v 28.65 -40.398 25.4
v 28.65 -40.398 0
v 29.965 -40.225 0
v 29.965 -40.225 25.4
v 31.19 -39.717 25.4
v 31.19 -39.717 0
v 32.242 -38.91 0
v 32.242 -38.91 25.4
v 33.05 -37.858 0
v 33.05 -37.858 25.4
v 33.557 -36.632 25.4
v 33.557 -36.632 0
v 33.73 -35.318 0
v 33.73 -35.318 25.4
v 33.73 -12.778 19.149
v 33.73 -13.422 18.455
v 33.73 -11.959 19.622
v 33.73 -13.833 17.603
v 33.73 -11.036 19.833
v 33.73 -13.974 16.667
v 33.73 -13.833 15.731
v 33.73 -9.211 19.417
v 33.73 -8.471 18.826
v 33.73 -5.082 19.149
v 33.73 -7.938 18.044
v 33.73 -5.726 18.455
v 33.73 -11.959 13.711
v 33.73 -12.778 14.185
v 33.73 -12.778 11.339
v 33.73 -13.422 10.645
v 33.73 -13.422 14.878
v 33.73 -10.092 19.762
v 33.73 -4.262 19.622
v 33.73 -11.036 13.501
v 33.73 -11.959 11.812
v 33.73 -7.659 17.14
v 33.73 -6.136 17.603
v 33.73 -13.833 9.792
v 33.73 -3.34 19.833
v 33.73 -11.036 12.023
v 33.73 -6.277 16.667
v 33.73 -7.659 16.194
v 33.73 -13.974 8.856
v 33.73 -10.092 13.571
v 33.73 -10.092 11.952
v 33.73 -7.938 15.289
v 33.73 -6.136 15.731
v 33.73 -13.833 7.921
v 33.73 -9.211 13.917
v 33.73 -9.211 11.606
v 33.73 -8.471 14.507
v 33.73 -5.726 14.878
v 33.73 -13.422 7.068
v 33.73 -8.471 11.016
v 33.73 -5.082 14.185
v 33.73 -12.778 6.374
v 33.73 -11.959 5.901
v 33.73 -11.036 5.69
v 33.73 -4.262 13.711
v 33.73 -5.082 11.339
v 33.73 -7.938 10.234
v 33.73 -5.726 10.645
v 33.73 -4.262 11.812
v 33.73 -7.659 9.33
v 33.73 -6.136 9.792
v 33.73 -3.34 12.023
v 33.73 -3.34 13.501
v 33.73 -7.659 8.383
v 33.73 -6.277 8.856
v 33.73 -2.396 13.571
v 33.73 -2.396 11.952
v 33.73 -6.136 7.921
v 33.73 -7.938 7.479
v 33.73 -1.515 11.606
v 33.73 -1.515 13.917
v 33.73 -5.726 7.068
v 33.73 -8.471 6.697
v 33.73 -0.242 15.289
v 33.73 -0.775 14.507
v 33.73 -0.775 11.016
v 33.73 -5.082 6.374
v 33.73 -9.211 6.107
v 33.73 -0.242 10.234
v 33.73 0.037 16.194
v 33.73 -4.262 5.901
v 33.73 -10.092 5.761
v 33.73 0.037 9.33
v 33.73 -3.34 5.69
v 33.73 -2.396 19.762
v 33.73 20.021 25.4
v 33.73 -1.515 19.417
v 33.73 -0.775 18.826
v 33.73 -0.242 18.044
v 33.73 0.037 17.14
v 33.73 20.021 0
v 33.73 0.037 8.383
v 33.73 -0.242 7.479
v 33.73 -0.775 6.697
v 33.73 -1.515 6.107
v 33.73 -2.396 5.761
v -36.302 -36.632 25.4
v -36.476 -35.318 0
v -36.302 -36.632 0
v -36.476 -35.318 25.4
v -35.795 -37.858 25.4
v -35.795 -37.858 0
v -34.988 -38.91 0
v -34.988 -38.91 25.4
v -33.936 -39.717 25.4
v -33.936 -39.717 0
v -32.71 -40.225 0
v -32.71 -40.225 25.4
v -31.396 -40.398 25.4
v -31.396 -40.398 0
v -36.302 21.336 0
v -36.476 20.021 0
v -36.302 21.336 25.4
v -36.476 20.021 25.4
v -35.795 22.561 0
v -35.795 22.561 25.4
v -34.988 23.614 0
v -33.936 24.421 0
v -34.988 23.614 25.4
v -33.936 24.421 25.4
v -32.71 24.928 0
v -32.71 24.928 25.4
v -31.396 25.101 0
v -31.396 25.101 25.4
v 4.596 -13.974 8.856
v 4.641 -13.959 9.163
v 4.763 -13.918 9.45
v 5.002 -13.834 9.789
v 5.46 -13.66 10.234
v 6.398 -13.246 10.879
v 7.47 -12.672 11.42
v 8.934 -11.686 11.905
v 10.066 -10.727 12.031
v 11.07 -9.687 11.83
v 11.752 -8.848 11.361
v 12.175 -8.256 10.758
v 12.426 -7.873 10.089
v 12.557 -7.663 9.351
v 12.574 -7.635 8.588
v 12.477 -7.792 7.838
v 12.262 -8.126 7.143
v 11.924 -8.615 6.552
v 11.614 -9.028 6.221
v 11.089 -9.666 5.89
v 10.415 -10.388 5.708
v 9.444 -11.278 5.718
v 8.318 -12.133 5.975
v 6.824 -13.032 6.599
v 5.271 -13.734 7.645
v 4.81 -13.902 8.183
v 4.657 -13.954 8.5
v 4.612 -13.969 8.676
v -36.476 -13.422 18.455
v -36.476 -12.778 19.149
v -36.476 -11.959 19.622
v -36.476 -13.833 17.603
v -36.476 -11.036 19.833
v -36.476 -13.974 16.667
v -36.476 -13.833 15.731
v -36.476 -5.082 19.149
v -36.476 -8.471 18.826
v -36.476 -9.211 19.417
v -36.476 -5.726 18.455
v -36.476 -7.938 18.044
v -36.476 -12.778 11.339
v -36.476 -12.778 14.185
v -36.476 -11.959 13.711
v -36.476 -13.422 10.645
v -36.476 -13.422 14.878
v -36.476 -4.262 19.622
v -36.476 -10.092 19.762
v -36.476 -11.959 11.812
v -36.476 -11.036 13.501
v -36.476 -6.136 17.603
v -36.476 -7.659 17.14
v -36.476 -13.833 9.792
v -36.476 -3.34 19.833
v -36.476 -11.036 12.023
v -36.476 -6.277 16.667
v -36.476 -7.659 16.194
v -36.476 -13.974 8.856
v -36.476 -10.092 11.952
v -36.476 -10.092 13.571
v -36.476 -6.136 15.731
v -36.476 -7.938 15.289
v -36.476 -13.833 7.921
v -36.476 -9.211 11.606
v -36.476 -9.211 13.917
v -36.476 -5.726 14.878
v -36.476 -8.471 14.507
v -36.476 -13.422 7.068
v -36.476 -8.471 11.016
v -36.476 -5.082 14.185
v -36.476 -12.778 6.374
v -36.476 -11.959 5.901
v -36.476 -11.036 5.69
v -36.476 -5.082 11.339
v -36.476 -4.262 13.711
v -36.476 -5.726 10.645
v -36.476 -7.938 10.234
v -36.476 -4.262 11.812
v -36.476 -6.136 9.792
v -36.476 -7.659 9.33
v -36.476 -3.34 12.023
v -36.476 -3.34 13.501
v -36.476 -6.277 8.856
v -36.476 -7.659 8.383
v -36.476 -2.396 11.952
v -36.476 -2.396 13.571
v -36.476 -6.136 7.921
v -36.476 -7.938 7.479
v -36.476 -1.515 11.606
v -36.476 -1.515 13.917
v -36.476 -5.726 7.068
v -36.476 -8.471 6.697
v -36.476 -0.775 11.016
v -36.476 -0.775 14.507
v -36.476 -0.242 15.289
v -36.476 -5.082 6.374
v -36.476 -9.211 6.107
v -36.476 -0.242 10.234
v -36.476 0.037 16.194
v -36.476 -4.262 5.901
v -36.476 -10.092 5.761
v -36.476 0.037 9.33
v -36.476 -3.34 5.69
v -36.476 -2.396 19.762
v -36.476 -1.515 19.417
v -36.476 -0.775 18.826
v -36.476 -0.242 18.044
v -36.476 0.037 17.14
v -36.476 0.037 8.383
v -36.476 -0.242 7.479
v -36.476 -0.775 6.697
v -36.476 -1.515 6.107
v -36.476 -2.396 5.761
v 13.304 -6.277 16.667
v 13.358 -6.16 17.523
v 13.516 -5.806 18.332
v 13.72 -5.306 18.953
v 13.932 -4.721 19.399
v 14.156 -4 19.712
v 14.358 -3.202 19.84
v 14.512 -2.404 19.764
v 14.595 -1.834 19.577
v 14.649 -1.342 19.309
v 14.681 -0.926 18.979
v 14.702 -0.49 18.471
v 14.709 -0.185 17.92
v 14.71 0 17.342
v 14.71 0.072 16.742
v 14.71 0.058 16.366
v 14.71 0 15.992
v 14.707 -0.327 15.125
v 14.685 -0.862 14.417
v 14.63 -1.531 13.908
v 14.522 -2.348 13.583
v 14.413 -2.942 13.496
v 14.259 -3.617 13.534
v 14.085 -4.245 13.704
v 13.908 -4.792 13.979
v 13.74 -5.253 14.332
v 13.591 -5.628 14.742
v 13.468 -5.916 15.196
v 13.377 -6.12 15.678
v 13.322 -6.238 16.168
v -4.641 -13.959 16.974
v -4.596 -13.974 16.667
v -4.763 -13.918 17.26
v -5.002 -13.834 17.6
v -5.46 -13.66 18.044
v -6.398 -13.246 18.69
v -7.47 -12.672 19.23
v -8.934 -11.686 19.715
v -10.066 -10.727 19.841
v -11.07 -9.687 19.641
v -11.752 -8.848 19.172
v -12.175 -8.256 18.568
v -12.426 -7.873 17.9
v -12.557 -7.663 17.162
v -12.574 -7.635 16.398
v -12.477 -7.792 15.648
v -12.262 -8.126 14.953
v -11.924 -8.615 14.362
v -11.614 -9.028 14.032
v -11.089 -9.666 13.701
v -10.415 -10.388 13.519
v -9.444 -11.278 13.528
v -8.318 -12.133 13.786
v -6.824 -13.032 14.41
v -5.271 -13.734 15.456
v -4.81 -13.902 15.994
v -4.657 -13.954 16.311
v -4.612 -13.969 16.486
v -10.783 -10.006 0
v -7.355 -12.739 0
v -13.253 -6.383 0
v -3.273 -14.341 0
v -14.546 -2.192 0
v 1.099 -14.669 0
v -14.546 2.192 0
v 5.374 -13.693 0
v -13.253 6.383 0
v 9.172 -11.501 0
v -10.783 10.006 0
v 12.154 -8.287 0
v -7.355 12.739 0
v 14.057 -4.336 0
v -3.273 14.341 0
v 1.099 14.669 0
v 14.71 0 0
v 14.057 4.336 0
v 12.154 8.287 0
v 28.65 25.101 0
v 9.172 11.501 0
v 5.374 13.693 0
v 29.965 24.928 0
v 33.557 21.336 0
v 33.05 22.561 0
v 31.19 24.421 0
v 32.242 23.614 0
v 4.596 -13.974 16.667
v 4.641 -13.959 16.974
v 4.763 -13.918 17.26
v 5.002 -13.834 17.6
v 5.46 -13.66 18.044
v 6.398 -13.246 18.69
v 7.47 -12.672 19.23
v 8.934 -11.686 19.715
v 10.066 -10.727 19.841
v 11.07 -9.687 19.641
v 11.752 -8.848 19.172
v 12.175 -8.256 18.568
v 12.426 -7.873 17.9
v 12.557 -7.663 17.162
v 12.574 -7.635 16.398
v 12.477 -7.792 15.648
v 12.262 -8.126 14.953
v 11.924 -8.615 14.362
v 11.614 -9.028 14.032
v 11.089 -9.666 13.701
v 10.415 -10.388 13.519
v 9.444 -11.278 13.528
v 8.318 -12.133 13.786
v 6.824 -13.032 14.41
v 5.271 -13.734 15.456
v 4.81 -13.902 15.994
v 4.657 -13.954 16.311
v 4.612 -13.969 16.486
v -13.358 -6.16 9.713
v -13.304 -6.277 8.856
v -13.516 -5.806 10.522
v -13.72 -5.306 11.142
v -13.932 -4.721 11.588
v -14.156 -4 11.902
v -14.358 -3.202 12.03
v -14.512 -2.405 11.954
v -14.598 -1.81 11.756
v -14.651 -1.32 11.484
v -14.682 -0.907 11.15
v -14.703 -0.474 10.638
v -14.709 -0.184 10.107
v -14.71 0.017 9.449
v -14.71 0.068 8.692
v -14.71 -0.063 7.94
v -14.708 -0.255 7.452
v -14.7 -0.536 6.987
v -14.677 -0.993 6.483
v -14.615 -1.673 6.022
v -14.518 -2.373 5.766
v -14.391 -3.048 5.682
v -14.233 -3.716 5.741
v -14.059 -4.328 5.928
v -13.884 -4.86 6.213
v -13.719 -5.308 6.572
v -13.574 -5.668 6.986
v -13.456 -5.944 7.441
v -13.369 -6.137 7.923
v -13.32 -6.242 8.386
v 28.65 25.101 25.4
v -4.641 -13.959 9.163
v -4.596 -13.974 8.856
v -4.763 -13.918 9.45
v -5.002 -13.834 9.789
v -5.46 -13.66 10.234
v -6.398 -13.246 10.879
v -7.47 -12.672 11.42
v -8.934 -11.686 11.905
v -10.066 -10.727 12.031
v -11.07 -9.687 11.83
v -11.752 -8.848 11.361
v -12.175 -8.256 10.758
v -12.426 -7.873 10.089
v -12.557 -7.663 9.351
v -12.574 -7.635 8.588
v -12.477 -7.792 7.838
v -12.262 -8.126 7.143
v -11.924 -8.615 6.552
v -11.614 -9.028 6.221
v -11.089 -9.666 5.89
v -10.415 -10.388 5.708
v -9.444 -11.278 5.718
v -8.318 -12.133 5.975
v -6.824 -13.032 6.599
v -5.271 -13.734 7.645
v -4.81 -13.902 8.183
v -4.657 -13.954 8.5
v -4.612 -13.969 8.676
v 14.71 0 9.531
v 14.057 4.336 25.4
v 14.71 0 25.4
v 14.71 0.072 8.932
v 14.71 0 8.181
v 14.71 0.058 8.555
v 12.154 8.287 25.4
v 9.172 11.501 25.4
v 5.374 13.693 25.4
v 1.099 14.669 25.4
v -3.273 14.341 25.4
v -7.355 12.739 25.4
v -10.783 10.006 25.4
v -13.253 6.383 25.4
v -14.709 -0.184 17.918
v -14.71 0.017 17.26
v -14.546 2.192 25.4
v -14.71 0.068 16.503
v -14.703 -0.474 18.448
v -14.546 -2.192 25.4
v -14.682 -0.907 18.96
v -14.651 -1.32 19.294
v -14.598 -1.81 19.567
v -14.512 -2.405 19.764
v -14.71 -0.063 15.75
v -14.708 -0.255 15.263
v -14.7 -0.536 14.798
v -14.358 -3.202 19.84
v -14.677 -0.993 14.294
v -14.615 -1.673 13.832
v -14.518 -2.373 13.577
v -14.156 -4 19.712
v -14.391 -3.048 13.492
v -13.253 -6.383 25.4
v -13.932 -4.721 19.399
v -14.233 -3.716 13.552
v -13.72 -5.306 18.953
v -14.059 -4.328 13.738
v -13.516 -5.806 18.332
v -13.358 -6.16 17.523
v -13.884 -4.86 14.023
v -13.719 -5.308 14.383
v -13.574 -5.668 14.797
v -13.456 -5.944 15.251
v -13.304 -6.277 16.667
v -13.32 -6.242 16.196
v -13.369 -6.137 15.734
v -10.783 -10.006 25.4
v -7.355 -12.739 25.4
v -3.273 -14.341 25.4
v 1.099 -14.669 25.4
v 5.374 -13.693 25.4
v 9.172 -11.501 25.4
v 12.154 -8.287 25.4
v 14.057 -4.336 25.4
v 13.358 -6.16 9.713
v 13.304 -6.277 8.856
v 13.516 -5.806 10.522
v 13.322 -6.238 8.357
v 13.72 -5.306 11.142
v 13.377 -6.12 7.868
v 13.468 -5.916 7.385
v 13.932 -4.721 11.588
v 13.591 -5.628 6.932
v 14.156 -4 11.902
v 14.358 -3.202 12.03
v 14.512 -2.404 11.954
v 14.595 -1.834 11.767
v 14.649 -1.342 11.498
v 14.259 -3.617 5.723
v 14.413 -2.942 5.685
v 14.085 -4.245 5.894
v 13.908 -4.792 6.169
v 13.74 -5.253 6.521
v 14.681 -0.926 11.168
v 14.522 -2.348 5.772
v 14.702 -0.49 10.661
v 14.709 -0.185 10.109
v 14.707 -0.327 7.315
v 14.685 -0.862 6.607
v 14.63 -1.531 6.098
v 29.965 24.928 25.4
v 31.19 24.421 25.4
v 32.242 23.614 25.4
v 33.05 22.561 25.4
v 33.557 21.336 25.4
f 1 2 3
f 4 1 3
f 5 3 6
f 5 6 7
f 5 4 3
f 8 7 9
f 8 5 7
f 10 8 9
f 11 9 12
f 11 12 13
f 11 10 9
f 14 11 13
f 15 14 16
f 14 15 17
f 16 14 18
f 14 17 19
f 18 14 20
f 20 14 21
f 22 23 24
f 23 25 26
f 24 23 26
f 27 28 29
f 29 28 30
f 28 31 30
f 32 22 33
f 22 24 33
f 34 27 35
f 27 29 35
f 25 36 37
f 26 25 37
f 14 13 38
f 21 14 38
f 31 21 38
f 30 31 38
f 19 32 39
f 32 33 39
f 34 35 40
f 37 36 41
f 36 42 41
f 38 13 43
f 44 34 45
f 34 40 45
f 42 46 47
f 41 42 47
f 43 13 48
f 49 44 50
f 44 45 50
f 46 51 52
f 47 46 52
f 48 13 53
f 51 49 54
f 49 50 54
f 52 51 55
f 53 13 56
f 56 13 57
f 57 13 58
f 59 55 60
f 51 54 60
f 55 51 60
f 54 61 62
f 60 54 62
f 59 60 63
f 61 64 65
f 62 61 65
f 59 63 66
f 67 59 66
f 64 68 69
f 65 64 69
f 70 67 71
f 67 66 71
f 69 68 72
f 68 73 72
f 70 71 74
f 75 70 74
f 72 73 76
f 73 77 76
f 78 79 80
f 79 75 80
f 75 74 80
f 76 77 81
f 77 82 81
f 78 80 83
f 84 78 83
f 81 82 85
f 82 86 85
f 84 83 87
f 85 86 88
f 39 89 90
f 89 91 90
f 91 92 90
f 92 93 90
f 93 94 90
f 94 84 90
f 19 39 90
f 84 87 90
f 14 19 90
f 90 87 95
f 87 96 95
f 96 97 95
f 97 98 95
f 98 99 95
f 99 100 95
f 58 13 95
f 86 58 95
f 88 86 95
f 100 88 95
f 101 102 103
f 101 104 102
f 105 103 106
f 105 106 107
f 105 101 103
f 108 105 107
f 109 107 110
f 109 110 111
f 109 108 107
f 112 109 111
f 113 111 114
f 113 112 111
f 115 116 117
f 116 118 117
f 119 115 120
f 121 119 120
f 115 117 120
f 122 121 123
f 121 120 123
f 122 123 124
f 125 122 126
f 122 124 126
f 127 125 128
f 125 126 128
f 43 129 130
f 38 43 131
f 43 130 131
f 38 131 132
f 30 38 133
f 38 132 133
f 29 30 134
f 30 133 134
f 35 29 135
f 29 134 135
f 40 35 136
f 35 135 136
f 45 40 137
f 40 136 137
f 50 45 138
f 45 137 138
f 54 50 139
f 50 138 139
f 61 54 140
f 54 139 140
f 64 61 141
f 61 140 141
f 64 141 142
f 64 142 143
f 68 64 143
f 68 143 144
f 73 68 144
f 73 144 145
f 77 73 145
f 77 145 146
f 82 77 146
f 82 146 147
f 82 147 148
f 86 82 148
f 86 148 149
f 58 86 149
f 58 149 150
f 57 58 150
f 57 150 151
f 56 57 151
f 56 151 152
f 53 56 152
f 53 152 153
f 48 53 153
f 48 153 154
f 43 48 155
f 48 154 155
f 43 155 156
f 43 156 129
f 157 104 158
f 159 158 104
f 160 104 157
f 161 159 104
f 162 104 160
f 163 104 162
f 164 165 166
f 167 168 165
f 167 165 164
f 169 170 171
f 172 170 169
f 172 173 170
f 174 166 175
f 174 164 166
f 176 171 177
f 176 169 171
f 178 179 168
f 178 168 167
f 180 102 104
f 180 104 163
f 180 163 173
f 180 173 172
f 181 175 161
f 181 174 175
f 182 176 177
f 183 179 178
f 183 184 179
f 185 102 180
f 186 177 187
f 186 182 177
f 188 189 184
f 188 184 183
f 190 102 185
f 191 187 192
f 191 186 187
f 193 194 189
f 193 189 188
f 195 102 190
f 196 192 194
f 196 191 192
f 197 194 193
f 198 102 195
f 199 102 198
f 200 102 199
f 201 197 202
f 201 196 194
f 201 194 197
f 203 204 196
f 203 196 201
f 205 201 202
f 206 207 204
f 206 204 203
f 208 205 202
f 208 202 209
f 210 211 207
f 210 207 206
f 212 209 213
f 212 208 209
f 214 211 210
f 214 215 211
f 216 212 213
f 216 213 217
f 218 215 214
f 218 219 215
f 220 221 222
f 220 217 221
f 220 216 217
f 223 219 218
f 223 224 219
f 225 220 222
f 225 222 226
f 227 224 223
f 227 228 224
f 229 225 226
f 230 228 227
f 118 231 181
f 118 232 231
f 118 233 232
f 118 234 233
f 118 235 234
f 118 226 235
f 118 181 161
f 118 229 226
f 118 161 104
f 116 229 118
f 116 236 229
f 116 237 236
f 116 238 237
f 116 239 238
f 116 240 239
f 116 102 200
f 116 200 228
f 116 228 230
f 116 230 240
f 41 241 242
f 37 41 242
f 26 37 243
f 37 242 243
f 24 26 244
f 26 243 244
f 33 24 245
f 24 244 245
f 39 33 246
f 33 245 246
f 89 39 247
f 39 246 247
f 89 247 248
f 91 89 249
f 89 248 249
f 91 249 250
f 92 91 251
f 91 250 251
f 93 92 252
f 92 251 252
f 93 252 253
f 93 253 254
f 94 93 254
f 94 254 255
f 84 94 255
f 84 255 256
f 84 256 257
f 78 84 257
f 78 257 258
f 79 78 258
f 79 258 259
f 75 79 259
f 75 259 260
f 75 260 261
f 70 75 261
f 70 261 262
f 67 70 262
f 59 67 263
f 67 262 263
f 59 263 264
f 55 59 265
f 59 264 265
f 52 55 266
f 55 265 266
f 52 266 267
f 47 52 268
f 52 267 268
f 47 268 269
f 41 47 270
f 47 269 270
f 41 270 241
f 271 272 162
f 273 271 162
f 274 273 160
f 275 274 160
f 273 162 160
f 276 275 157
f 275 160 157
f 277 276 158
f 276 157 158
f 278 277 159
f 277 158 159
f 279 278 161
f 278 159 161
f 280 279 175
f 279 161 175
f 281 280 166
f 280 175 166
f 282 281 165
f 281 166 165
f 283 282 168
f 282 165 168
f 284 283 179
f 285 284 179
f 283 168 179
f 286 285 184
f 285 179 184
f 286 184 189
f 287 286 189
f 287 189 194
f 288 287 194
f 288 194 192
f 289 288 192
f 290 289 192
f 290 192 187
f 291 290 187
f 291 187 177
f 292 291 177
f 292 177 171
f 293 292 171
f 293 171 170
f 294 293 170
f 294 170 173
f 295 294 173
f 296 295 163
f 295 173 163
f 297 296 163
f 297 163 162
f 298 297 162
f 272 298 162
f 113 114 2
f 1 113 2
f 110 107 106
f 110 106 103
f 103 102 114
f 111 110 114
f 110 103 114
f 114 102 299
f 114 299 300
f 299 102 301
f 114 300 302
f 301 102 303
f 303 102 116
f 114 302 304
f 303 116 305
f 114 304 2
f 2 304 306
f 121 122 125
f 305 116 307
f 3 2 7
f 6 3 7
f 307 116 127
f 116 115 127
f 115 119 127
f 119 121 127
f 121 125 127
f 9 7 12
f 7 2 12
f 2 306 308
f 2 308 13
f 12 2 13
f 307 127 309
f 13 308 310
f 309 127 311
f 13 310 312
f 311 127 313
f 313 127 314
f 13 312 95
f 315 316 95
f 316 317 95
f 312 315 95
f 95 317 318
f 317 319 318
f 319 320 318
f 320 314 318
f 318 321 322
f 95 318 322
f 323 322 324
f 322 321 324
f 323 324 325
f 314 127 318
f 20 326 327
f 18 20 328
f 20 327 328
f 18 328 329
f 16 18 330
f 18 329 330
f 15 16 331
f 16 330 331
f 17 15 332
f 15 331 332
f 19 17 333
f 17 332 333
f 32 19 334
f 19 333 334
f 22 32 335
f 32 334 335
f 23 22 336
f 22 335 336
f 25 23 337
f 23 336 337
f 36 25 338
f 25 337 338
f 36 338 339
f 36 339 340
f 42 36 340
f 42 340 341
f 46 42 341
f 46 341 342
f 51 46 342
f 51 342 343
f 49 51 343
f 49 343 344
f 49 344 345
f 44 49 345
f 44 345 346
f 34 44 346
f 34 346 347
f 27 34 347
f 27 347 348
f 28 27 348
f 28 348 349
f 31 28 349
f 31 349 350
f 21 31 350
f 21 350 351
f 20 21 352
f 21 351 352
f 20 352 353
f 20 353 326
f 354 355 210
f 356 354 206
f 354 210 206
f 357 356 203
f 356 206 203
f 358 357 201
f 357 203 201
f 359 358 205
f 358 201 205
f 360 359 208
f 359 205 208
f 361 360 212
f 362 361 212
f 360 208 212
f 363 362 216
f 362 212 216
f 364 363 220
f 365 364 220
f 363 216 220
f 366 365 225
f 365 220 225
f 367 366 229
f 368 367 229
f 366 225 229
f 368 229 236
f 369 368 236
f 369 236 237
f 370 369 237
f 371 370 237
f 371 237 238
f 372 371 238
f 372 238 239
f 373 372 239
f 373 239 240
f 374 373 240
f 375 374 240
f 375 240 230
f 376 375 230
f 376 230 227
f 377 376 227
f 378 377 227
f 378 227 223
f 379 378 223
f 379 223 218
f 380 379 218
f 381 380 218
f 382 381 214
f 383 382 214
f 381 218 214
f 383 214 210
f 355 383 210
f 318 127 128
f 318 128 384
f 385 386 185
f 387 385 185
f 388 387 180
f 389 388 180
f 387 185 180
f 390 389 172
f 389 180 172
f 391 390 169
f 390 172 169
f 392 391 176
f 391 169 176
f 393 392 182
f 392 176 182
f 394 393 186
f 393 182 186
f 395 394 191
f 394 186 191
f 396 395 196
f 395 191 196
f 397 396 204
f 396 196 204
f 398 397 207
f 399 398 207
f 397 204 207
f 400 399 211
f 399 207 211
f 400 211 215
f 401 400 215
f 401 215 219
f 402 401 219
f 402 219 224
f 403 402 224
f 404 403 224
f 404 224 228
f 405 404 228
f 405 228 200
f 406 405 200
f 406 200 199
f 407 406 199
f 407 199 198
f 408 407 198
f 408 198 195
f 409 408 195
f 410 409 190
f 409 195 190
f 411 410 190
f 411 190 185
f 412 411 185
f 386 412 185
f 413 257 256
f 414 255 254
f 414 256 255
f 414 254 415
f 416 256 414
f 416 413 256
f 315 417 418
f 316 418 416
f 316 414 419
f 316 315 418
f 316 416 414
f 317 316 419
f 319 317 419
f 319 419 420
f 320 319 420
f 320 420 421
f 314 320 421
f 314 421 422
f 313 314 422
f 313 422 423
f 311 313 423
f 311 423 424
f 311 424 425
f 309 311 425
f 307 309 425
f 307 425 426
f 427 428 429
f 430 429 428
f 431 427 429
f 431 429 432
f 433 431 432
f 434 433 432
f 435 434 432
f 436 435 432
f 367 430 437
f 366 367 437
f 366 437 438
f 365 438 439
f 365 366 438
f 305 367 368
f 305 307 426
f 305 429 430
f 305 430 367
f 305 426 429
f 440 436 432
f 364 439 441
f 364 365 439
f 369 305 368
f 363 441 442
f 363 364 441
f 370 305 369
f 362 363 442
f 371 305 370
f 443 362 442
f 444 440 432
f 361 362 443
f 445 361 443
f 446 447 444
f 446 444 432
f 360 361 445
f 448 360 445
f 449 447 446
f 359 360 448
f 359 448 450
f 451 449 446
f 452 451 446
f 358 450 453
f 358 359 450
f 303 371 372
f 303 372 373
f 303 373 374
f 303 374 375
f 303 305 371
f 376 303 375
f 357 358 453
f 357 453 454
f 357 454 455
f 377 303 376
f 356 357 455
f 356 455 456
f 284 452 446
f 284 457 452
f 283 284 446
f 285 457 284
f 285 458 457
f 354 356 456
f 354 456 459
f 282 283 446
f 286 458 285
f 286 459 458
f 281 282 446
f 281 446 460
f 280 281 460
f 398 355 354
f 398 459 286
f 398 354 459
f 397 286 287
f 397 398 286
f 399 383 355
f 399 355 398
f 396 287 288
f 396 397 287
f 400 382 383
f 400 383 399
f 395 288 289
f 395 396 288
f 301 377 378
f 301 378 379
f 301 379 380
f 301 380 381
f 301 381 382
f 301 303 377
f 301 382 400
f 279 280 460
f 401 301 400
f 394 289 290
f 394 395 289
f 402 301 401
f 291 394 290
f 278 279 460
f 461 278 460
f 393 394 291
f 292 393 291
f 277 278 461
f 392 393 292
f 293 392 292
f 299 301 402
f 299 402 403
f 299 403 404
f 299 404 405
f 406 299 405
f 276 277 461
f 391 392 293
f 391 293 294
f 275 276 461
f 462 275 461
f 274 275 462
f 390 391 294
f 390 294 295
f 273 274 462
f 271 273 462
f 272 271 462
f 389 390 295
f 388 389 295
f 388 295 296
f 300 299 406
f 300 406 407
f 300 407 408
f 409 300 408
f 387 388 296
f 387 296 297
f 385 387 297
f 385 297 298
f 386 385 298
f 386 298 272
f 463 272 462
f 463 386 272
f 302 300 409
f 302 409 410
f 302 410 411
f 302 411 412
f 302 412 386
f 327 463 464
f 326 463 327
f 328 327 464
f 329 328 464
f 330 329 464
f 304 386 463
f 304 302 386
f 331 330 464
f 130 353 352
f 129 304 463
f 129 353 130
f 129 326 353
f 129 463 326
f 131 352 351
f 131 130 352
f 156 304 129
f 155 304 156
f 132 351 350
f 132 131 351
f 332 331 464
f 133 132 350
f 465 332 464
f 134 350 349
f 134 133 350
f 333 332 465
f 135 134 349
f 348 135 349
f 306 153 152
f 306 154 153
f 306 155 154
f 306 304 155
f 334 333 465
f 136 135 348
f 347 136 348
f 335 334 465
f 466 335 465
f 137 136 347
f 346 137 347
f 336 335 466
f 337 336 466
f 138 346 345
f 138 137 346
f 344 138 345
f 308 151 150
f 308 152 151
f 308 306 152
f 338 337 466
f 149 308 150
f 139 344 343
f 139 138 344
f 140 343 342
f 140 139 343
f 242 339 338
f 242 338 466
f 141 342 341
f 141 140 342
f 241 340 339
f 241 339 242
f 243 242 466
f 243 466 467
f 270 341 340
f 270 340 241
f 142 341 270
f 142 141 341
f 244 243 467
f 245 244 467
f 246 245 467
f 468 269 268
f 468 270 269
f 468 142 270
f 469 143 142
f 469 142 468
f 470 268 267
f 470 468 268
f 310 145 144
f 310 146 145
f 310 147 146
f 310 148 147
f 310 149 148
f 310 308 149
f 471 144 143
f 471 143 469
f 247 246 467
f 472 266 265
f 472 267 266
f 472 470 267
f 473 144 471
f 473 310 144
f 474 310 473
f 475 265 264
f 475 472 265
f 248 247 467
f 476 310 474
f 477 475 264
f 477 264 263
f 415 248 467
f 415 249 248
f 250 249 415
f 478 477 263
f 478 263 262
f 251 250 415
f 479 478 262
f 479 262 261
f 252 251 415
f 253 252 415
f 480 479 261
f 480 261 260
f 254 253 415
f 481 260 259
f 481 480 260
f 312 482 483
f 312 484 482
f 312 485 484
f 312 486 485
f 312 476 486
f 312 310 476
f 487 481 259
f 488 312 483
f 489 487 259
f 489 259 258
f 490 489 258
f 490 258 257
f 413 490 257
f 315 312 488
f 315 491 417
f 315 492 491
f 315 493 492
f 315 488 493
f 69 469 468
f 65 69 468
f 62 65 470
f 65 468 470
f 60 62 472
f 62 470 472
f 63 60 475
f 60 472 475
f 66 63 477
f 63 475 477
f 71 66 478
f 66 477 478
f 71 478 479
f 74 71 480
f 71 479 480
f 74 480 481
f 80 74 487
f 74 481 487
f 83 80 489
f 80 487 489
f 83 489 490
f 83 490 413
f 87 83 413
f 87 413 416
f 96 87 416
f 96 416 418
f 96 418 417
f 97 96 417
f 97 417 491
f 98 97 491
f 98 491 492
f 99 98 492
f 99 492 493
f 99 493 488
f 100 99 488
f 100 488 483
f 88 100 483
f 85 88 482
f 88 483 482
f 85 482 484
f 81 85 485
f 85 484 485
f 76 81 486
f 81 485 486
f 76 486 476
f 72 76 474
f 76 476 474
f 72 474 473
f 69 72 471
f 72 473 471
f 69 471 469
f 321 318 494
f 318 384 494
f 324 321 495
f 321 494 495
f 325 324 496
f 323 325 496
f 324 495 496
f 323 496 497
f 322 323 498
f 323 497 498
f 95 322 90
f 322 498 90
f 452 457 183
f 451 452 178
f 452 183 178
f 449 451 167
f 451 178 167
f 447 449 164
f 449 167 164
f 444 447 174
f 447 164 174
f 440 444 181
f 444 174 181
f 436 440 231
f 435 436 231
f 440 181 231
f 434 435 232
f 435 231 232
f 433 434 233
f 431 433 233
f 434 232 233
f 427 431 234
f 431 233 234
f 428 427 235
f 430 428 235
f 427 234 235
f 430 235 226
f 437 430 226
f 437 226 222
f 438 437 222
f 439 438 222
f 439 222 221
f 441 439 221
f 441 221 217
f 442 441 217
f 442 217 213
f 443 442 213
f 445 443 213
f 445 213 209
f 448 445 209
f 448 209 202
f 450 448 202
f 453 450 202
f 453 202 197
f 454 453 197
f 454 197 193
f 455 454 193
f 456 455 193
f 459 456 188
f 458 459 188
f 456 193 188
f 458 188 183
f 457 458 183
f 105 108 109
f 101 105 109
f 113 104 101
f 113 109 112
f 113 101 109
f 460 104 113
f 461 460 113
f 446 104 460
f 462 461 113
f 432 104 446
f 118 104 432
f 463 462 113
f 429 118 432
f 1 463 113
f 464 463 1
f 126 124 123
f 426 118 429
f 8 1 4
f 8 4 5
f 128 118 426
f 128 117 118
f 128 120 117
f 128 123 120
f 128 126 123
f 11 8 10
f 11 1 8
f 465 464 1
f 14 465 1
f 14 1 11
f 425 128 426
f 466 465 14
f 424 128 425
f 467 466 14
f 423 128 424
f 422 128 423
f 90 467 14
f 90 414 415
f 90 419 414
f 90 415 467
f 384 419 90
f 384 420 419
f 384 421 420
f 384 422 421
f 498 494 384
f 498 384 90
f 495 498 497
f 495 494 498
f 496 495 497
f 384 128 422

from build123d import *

# Parameters (mm, degrees)
F0_W     = 70.205692
F0_H     = 65.499166
F0_R     = 14.710247
F1_DEPTH = 25.4
F2_R     = 5.08
F3_R     = 5.08
F5_D     = 6.35


with BuildPart() as f1:
    # F0 (on Top) → F1 (new body)
    with BuildSketch(Plane.XY):
        with Locations((-1.372734, -7.648109)):
            Rectangle(F0_W, F0_H)
        Circle(F0_R, mode=Mode.SUBTRACT)
    extrude(amount=F1_DEPTH)

    # F2
    f2_edges = [f1.edges().sort_by_distance(p)[0] for p in [
        (-36.47558, 25.101474, 12.7),
    ]]
    fillet(f2_edges, radius=F2_R)

    # F3
    f3_edges = [f1.edges().sort_by_distance(p)[0] for p in [
        (33.730112, 25.101474, 12.7),
        (33.730112, -40.397692, 12.7),
        (-36.47558, -40.397692, 12.7),
    ]]
    fillet(f3_edges, radius=F3_R)

    # F5 (through all)
    with Locations(Plane.YZ.offset(33.730112)):
        with Locations((-3.10241, 16.666889), (-3.10241, 8.856437), (-10.79876, 8.856437), (-10.79876, 16.666889)):
            Hole(F5_D / 2)


solid = f1.part
